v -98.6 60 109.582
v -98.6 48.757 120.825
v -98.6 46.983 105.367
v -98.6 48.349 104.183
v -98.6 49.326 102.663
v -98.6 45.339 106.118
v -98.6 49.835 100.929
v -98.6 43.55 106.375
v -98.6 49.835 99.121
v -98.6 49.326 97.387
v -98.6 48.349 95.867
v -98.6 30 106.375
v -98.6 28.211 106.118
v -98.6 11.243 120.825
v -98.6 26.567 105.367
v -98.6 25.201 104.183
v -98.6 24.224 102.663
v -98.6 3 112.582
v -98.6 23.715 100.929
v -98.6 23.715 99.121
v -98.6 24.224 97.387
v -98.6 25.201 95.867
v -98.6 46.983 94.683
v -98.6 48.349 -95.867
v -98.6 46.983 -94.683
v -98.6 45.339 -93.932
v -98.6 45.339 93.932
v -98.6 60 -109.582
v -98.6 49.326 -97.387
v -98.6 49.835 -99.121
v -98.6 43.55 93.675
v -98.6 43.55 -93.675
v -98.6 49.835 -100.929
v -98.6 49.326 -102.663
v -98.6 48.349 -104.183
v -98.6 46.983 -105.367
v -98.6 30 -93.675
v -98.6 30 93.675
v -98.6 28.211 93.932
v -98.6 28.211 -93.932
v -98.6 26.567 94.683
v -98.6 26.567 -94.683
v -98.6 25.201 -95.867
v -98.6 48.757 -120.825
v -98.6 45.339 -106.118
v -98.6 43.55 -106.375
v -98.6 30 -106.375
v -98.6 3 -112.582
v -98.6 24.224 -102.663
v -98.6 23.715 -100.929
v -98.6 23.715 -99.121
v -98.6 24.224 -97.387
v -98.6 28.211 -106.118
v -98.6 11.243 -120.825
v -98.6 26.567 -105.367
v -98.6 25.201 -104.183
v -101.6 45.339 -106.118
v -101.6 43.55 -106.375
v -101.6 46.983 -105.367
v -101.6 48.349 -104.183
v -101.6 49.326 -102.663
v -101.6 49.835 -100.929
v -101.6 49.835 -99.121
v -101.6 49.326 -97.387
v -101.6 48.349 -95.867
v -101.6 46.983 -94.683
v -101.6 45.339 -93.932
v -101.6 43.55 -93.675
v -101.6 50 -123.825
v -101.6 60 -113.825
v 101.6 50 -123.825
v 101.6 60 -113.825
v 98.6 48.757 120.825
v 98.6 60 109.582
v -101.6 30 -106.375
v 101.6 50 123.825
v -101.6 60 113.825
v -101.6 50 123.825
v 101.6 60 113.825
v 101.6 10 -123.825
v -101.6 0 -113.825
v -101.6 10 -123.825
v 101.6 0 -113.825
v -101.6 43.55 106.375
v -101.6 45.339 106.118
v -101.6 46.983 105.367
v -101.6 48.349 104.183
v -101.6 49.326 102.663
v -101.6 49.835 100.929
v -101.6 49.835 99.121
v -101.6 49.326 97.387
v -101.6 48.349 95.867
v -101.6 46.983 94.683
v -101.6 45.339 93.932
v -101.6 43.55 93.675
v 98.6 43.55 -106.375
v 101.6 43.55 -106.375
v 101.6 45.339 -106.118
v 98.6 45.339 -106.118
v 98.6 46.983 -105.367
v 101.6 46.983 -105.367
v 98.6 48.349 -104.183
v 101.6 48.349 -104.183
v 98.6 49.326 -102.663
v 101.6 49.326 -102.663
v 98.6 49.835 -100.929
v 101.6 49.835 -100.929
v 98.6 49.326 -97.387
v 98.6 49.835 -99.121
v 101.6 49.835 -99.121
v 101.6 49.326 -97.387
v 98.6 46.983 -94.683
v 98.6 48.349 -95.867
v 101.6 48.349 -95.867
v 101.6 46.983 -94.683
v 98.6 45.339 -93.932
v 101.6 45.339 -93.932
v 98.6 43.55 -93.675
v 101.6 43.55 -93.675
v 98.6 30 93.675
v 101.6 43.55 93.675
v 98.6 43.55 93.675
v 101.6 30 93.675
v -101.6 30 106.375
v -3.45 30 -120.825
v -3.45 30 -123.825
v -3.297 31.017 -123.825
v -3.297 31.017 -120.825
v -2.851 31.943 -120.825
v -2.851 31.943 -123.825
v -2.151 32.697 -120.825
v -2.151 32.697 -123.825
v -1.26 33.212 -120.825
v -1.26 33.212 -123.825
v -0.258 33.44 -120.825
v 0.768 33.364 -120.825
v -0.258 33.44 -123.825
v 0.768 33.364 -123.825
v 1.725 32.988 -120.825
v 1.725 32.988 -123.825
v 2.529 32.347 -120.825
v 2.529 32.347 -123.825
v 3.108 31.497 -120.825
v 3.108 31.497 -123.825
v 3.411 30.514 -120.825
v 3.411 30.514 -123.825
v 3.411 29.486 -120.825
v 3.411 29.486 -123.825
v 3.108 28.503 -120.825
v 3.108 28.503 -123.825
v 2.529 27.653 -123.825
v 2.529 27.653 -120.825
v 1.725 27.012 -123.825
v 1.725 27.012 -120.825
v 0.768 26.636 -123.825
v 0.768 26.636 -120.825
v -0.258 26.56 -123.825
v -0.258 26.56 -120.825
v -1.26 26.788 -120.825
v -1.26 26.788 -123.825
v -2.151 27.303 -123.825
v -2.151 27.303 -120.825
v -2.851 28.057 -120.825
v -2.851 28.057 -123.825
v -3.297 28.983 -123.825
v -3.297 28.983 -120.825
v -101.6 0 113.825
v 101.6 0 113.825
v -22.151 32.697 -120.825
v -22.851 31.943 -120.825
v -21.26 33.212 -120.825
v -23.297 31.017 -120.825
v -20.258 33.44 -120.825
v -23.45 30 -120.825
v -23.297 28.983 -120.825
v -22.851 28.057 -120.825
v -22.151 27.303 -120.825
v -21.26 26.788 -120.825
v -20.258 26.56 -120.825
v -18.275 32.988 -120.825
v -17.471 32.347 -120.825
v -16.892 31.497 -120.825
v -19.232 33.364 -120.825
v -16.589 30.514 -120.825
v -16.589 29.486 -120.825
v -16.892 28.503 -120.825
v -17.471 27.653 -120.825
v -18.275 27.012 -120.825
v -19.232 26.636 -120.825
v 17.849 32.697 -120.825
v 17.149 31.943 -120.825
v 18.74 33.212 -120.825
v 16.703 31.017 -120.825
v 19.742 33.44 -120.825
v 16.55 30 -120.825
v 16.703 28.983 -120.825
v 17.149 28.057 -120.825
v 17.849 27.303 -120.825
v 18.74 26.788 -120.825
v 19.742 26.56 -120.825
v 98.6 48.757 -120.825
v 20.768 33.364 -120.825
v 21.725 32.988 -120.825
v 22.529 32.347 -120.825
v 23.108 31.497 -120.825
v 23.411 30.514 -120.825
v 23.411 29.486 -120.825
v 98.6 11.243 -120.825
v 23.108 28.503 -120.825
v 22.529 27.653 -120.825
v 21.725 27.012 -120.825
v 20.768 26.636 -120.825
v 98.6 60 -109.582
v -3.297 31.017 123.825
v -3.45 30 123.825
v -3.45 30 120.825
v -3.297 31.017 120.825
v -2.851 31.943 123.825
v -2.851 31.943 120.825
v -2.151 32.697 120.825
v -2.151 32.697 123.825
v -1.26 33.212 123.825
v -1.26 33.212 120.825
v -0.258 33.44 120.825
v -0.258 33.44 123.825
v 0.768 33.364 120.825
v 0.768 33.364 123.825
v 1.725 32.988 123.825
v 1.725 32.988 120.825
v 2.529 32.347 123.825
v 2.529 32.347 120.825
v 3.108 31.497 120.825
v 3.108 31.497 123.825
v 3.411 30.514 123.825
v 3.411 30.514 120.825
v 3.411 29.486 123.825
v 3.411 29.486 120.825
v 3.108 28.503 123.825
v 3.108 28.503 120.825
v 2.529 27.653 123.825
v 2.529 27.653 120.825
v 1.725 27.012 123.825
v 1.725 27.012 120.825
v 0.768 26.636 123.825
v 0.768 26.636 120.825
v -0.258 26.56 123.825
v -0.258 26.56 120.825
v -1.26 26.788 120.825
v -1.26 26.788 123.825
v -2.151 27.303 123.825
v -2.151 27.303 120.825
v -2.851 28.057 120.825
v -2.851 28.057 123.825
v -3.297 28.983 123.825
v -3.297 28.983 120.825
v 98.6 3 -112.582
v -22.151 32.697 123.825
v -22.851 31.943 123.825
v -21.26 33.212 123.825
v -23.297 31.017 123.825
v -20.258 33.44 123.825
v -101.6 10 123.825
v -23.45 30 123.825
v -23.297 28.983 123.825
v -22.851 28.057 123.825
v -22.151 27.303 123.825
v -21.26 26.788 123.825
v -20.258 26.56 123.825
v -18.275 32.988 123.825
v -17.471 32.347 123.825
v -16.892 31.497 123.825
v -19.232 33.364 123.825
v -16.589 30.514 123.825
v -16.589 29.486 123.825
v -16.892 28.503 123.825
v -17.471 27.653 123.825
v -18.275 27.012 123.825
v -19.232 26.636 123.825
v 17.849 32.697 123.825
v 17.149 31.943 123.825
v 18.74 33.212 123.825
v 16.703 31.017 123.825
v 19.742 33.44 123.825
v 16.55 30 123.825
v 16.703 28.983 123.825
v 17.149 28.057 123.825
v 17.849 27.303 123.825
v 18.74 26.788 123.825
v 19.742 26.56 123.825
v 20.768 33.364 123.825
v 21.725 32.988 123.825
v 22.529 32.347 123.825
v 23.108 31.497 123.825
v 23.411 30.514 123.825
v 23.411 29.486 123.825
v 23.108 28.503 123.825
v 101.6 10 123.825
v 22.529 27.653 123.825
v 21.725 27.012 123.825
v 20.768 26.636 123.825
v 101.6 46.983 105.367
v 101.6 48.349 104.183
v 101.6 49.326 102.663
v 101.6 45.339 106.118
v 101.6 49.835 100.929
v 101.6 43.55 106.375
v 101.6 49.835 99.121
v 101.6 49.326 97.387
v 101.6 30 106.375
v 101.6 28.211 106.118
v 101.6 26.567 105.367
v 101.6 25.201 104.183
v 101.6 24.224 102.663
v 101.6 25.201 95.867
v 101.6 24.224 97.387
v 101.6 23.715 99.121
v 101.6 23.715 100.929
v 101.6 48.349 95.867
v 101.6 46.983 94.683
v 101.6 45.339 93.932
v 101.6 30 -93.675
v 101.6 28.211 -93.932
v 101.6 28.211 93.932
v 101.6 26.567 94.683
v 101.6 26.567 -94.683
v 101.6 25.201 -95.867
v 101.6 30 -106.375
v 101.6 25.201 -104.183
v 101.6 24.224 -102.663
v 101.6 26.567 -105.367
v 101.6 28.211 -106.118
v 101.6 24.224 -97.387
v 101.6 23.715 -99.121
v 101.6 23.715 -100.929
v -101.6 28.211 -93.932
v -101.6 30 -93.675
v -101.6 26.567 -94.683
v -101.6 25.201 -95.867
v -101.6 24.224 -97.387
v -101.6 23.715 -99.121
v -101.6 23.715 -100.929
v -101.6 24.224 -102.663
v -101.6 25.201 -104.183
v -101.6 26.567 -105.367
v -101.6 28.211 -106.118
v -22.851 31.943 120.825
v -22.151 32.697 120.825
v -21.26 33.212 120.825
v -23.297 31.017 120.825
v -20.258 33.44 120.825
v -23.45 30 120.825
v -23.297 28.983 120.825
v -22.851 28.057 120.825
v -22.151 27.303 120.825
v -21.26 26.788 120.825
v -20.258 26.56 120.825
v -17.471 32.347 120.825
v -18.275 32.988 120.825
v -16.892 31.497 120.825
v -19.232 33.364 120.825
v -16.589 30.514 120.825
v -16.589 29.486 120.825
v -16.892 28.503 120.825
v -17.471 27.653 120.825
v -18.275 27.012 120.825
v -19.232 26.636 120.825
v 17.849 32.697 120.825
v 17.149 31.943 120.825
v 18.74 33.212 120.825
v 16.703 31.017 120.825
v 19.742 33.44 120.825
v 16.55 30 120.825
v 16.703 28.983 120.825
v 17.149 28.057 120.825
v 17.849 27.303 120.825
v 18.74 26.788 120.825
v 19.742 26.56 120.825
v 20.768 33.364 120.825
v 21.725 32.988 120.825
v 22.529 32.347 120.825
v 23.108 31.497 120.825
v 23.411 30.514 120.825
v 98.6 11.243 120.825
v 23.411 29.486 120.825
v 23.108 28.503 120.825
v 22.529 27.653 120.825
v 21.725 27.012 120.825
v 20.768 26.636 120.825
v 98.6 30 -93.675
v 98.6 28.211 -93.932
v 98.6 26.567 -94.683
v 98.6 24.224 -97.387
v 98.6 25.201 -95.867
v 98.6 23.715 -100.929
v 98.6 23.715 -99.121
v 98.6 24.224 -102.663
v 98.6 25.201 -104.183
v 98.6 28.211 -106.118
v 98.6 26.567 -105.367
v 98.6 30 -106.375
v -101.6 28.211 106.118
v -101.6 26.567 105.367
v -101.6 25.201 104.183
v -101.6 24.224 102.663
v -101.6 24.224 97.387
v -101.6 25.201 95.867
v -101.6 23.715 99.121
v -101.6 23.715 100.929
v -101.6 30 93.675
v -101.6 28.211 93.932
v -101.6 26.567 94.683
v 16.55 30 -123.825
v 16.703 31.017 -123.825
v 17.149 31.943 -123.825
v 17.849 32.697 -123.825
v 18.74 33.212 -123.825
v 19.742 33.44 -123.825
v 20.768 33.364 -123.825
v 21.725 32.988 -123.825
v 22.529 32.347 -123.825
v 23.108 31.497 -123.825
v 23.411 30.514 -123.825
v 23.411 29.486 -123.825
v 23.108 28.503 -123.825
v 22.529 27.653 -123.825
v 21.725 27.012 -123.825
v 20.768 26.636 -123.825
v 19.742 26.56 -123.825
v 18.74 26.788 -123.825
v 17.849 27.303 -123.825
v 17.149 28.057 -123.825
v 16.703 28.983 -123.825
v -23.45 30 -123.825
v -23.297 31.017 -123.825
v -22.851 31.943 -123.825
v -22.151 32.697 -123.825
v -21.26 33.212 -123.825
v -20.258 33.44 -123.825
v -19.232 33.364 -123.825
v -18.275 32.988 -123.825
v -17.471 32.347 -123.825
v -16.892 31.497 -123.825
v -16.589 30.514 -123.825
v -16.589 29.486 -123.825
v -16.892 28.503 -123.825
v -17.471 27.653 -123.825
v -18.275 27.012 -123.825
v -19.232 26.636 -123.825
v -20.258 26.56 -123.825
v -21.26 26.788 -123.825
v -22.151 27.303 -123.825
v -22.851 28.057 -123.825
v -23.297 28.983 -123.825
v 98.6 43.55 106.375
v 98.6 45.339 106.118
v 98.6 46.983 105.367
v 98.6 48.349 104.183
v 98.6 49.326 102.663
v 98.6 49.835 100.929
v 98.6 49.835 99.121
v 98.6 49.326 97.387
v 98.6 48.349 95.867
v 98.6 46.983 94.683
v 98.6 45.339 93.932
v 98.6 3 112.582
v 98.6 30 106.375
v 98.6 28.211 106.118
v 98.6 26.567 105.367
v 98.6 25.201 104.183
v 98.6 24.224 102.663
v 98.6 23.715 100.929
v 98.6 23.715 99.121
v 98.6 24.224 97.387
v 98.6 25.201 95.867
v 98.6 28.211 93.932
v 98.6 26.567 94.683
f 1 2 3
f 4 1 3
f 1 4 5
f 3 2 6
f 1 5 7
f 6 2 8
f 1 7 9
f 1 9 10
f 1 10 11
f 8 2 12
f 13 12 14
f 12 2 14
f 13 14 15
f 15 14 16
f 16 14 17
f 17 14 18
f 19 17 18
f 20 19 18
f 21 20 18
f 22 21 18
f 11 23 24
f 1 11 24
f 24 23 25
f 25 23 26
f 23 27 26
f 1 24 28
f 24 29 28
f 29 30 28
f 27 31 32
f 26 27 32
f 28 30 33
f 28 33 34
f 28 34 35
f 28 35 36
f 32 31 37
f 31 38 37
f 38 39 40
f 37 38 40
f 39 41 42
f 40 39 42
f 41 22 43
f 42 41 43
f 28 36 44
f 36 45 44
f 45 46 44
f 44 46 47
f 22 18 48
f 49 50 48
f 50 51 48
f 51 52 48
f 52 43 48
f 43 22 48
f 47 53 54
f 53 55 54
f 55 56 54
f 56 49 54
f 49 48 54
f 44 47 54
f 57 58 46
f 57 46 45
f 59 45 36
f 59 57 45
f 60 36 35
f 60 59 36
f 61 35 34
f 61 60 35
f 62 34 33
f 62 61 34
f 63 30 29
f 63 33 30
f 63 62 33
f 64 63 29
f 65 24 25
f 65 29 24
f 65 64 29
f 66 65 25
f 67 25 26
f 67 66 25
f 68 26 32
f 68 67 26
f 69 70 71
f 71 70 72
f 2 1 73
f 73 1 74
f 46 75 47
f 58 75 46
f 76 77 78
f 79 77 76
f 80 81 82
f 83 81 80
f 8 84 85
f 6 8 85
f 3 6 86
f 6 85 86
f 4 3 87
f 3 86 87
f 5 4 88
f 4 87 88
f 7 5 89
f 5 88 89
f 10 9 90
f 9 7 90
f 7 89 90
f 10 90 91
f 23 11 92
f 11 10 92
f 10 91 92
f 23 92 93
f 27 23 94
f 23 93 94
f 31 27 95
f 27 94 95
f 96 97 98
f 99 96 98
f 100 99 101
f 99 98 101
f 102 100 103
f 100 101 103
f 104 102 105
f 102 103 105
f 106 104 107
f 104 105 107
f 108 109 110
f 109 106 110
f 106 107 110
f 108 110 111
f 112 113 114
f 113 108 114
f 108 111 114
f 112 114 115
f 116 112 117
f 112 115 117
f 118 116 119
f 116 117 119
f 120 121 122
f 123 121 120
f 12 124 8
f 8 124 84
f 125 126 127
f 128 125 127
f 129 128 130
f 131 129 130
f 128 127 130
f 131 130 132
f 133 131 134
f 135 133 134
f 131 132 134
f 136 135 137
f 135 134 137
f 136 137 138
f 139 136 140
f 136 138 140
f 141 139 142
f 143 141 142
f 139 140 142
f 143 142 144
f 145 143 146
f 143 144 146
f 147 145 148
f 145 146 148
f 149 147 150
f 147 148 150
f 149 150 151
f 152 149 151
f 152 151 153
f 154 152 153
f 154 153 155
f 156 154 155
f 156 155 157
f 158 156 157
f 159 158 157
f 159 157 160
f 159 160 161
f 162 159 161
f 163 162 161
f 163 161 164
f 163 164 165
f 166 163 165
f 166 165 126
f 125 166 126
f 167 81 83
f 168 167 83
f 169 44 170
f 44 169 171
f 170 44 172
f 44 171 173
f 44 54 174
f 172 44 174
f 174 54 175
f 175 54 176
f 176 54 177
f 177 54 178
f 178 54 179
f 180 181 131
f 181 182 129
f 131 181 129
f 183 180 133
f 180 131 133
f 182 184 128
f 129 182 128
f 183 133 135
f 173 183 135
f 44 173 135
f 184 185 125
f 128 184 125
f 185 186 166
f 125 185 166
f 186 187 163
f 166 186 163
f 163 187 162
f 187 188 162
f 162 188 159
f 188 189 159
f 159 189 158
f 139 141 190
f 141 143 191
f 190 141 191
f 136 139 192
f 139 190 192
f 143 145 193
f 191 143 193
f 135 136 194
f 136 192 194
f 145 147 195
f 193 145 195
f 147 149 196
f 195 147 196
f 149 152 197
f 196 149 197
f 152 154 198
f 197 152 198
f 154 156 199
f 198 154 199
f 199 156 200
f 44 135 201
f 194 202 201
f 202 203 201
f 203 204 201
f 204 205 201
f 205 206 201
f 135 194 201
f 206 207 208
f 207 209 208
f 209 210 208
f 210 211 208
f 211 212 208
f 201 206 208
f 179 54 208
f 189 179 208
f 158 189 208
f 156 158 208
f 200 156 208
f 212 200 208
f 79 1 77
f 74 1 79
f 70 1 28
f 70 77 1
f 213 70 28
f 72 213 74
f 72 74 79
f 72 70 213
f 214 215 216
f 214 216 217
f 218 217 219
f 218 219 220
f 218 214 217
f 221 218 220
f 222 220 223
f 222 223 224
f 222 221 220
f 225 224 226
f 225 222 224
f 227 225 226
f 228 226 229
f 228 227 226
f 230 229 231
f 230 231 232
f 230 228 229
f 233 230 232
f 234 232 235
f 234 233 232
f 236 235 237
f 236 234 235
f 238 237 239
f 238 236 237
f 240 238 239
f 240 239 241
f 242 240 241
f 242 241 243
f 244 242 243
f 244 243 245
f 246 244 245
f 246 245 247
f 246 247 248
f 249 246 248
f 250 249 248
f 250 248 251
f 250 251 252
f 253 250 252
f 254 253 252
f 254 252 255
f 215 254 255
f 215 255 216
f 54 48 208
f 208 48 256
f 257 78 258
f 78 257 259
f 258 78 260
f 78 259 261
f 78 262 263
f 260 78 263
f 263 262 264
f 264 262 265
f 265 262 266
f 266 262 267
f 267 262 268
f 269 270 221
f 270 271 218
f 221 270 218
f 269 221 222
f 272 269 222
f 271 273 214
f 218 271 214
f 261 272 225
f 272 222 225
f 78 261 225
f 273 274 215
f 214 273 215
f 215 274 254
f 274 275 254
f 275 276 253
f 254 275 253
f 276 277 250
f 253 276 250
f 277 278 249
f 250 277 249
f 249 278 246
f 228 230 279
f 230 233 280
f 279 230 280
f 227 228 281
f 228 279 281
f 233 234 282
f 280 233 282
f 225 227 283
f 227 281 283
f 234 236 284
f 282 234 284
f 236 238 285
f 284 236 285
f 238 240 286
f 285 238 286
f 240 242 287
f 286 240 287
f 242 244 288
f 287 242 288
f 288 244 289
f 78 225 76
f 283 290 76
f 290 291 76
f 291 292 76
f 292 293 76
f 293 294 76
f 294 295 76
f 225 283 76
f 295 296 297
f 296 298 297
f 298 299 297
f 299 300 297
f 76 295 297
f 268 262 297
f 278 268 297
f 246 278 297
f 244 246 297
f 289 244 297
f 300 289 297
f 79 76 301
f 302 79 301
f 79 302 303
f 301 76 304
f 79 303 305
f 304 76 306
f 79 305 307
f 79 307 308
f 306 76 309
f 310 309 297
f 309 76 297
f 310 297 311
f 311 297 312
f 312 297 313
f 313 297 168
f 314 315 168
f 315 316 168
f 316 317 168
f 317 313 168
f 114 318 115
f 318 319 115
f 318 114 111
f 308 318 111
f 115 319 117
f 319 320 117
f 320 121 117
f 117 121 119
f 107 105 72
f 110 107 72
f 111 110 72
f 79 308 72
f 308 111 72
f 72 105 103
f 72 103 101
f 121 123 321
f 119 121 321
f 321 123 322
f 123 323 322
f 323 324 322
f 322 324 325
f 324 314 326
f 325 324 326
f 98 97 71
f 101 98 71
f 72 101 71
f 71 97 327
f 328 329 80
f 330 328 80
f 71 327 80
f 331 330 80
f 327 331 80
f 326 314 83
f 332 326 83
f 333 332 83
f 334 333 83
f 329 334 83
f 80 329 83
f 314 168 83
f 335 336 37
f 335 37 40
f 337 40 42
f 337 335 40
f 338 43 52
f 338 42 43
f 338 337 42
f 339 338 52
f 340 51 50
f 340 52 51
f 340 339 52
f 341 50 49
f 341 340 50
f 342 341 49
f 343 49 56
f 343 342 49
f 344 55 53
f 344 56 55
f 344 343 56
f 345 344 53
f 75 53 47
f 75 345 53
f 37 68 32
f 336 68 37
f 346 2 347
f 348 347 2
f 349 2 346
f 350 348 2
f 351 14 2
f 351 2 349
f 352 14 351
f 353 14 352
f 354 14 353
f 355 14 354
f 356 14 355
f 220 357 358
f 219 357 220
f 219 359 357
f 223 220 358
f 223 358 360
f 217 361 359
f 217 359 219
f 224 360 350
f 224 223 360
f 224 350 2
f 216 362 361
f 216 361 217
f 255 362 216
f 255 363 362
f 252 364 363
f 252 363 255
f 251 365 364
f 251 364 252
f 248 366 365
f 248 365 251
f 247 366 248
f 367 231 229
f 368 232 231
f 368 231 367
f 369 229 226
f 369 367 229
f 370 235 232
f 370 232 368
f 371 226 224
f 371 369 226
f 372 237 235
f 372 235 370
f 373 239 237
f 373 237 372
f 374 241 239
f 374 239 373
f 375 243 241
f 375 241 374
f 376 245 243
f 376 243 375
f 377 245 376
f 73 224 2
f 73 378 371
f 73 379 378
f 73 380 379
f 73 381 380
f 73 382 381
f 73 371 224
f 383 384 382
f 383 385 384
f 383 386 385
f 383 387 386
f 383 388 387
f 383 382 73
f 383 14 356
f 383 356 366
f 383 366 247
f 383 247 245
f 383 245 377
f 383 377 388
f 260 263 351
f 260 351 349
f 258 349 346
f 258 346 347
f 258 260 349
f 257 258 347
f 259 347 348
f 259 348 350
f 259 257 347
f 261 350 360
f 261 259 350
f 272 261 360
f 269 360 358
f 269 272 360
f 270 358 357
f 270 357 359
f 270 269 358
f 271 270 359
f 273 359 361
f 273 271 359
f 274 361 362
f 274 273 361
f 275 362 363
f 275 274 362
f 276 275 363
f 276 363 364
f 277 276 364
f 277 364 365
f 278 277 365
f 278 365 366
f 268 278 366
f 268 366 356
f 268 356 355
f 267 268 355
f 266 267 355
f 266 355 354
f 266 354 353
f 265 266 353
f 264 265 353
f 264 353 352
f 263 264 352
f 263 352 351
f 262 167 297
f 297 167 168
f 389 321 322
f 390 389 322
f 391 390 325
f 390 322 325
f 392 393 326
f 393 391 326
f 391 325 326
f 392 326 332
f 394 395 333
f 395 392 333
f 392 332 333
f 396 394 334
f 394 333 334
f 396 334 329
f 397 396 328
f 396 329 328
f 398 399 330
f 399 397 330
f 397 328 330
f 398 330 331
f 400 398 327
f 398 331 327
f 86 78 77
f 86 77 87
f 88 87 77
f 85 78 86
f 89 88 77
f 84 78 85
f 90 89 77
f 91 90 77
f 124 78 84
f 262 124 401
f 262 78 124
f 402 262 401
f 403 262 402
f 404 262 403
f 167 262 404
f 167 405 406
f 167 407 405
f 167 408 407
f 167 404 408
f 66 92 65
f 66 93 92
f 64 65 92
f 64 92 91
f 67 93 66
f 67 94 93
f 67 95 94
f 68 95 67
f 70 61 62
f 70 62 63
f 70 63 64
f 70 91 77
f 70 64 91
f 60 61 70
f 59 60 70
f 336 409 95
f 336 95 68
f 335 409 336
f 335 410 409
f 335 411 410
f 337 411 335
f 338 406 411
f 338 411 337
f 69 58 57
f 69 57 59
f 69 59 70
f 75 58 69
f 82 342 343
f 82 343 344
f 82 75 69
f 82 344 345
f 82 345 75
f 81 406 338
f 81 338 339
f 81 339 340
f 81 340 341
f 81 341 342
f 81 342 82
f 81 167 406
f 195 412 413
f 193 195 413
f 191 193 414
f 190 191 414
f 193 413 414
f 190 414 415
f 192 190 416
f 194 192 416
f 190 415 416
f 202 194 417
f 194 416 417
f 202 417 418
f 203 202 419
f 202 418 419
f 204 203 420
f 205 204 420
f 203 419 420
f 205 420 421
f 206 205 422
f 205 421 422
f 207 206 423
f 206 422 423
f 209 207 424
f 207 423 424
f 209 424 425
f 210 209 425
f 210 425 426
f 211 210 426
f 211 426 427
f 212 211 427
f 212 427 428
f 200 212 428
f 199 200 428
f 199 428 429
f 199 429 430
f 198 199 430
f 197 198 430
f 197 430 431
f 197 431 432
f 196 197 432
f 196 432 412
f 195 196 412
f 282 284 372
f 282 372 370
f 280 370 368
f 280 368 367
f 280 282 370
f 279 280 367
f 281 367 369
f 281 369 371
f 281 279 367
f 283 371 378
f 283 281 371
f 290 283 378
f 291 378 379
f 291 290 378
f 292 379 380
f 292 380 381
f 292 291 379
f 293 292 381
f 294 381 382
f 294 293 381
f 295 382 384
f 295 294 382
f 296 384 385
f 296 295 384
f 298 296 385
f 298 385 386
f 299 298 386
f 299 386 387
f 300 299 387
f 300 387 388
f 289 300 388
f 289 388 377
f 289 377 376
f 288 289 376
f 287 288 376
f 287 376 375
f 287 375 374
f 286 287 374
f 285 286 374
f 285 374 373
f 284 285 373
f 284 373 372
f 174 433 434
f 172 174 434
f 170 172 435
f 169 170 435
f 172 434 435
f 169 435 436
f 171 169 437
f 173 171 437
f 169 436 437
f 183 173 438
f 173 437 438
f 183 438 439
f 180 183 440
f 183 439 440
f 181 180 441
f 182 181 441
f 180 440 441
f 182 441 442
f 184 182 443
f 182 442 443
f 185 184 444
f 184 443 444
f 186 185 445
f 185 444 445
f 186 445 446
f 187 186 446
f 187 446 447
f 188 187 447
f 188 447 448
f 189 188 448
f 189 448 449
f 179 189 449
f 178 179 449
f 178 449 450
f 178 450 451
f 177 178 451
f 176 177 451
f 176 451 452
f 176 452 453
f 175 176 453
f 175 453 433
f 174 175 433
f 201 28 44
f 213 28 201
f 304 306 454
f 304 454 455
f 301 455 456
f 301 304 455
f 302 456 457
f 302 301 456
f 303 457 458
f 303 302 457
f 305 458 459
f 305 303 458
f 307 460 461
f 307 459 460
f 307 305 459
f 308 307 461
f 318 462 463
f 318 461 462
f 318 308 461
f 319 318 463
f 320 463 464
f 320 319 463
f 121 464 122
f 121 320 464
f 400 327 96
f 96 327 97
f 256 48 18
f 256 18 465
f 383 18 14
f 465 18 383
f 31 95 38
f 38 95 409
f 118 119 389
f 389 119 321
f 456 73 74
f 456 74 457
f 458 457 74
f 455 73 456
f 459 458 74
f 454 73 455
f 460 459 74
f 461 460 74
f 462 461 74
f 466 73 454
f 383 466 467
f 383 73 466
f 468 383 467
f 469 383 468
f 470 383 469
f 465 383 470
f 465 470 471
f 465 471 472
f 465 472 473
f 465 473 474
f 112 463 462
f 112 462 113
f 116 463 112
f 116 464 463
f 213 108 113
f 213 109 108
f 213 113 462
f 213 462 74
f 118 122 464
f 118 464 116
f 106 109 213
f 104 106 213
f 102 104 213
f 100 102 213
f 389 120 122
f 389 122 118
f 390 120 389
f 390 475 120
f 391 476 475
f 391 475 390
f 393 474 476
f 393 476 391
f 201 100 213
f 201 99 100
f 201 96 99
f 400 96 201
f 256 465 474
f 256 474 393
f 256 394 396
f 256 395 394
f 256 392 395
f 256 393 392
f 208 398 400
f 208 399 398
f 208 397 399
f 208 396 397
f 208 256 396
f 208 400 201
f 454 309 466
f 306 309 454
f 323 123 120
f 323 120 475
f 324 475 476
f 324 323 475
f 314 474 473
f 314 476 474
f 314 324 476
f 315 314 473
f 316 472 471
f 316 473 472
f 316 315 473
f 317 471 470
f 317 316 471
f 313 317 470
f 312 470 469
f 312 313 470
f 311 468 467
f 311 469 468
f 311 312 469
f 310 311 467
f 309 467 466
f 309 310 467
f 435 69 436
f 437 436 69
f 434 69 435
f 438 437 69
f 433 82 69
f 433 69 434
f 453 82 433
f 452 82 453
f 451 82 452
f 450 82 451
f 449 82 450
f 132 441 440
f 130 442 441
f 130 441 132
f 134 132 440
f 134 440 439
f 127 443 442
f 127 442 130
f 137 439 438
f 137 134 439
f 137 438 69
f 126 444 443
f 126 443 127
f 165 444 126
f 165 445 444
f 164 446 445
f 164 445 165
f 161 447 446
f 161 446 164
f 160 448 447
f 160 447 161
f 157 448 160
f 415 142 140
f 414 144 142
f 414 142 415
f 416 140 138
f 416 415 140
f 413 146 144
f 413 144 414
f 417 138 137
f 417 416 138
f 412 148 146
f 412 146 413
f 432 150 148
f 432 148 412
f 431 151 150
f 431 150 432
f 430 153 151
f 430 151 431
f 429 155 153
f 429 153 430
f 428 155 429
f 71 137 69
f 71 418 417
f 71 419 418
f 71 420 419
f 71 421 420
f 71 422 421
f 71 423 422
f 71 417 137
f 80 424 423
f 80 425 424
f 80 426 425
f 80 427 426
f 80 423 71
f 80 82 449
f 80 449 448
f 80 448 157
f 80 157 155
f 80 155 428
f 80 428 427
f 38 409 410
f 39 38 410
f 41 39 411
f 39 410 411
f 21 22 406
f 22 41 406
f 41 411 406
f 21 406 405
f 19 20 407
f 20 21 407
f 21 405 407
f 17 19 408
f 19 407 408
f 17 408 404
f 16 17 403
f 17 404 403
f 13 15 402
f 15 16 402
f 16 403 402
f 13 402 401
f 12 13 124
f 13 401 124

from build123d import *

# Parameters (mm, degrees)
SKETCH1_W                                = 203.2
SKETCH1_H                                = 247.65
BOSS_EXTRUDE1_DEPTH                      = 60
CHAMFER1_SIZE                            = 10
SHELL3_T                                 = -3
CUT_EXTRUDE1_REACH                       = 247.403
MIRROR1_AT_THE_SECOND_PLANE_COPY_1_REACH = 247.403
CUT_EXTRUDE2_REACH                       = 276.323
SKETCH3_R                                = 3.45


with BuildPart() as part:
    # Sketch1 → Boss-Extrude1 (new body)
    with BuildSketch(Plane(origin=(0, 0, 0), x_dir=(1, 0, 0), z_dir=(0, 1, 0))):
        Rectangle(SKETCH1_W, SKETCH1_H)
    extrude(amount=BOSS_EXTRUDE1_DEPTH)

    # Chamfer1
    chamfer1_edges = [part.edges().sort_by_distance(p)[0] for p in [
        (0, 60, 123.825),
        (0, 0, 123.825),
        (0, 0, -123.825),
        (0, 60, -123.825),
    ]]
    chamfer(chamfer1_edges, length=CHAMFER1_SIZE)

    # Shell3
    shell3_openings = [part.faces().sort_by_distance(p)[0] for p in [
        (0, 60, 0),
    ]]
    offset(amount=SHELL3_T, openings=shell3_openings, kind=Kind.INTERSECTION)

    # Sketch2 → Cut-Extrude1 (cut, up to next)
    with BuildSketch(Plane.ZY.offset(101.6), mode=Mode.PRIVATE) as cut_extrude1_sk1:
        with BuildLine():
            Line((-93.675, 43.55), (-93.675, 30))
            ThreePointArc((-93.675, 30), (-100.025, 23.65), (-106.375, 30))
            Line((-106.375, 30), (-106.375, 43.55))
            ThreePointArc((-106.375, 43.55), (-100.025, 49.9), (-93.675, 43.55))
        make_face()
    cut_extrude1_tool1 = extrude(cut_extrude1_sk1.sketch, amount=-CUT_EXTRUDE1_REACH, mode=Mode.PRIVATE) & part.part
    cut_extrude1 = cut_extrude1_tool1.solids().sort_by_distance((-101.6, 36.775, -100.025))[0]
    add(cut_extrude1, mode=Mode.SUBTRACT)

    # Mirror1: Cut-Extrude1 across plane
    add(cut_extrude1.mirror(Plane.XY), mode=Mode.SUBTRACT)

    # Mirror1 at the second plane: Cut-Extrude1 across plane
    add(cut_extrude1.mirror(Plane(origin=(0, 0, 0), x_dir=(0, 0, 1), z_dir=(1, 0, 0))), mode=Mode.SUBTRACT)

    # Mirror1 at the second plane copy 1 sketc → Mirror1 at the second plane copy 1 (cut, up to next)
    with BuildSketch(Plane(origin=(101.6, 0, 0), x_dir=(0, 0, -1), z_dir=(1, 0, 0)), mode=Mode.PRIVATE) as mirror1_at_the_second_plane_copy_1_sk1:
        with BuildLine():
            Line((-93.675, 43.55), (-93.675, 30))
            ThreePointArc((-93.675, 30), (-100.025, 23.65), (-106.375, 30))
            Line((-106.375, 30), (-106.375, 43.55))
            ThreePointArc((-106.375, 43.55), (-100.025, 49.9), (-93.675, 43.55))
        make_face()
    mirror1_at_the_second_plane_copy_1_tool1 = extrude(mirror1_at_the_second_plane_copy_1_sk1.sketch, amount=-MIRROR1_AT_THE_SECOND_PLANE_COPY_1_REACH, mode=Mode.PRIVATE) & part.part
    add(mirror1_at_the_second_plane_copy_1_tool1.solids().sort_by_distance((101.6, 36.775, 100.025))[0], mode=Mode.SUBTRACT)

    # Sketch3 → Cut-Extrude2 (cut, up to next)
    with BuildSketch(Plane(origin=(0, 0, -123.825), x_dir=(-1, 0, 0), z_dir=(0, 0, -1)), mode=Mode.PRIVATE) as cut_extrude2_sk1:
        with Locations((0, 30)):
            Circle(SKETCH3_R)
    cut_extrude2_tool1 = extrude(cut_extrude2_sk1.sketch, amount=-CUT_EXTRUDE2_REACH, mode=Mode.PRIVATE) & part.part
    # Sketch3 → Cut-Extrude2 (cut, up to next)
    with BuildSketch(Plane(origin=(0, 0, -123.825), x_dir=(-1, 0, 0), z_dir=(0, 0, -1)), mode=Mode.PRIVATE) as cut_extrude2_sk2:
        with Locations((20, 30)):
            Circle(SKETCH3_R)
    cut_extrude2_tool2 = extrude(cut_extrude2_sk2.sketch, amount=-CUT_EXTRUDE2_REACH, mode=Mode.PRIVATE) & part.part
    # Sketch3 → Cut-Extrude2 (cut, up to next)
    with BuildSketch(Plane(origin=(0, 0, -123.825), x_dir=(-1, 0, 0), z_dir=(0, 0, -1)), mode=Mode.PRIVATE) as cut_extrude2_sk3:
        with Locations((-20, 30)):
            Circle(SKETCH3_R)
    cut_extrude2_tool3 = extrude(cut_extrude2_sk3.sketch, amount=-CUT_EXTRUDE2_REACH, mode=Mode.PRIVATE) & part.part
    cut_extrude2_1 = cut_extrude2_tool1.solids().sort_by_distance((0, 30, -123.825))[0]
    add(cut_extrude2_1, mode=Mode.SUBTRACT)
    cut_extrude2_2 = cut_extrude2_tool2.solids().sort_by_distance((-20, 30, -123.825))[0]
    add(cut_extrude2_2, mode=Mode.SUBTRACT)
    cut_extrude2_3 = cut_extrude2_tool3.solids().sort_by_distance((20, 30, -123.825))[0]
    add(cut_extrude2_3, mode=Mode.SUBTRACT)
    cut_extrude2 = cut_extrude2_1 + cut_extrude2_2 + cut_extrude2_3  # Cut-Extrude2 as one shape, for the pattern or mirror that repeats it

    # Mirror2: Cut-Extrude2 across plane
    add(cut_extrude2.mirror(Plane.XY), mode=Mode.SUBTRACT)


solid = part.part
